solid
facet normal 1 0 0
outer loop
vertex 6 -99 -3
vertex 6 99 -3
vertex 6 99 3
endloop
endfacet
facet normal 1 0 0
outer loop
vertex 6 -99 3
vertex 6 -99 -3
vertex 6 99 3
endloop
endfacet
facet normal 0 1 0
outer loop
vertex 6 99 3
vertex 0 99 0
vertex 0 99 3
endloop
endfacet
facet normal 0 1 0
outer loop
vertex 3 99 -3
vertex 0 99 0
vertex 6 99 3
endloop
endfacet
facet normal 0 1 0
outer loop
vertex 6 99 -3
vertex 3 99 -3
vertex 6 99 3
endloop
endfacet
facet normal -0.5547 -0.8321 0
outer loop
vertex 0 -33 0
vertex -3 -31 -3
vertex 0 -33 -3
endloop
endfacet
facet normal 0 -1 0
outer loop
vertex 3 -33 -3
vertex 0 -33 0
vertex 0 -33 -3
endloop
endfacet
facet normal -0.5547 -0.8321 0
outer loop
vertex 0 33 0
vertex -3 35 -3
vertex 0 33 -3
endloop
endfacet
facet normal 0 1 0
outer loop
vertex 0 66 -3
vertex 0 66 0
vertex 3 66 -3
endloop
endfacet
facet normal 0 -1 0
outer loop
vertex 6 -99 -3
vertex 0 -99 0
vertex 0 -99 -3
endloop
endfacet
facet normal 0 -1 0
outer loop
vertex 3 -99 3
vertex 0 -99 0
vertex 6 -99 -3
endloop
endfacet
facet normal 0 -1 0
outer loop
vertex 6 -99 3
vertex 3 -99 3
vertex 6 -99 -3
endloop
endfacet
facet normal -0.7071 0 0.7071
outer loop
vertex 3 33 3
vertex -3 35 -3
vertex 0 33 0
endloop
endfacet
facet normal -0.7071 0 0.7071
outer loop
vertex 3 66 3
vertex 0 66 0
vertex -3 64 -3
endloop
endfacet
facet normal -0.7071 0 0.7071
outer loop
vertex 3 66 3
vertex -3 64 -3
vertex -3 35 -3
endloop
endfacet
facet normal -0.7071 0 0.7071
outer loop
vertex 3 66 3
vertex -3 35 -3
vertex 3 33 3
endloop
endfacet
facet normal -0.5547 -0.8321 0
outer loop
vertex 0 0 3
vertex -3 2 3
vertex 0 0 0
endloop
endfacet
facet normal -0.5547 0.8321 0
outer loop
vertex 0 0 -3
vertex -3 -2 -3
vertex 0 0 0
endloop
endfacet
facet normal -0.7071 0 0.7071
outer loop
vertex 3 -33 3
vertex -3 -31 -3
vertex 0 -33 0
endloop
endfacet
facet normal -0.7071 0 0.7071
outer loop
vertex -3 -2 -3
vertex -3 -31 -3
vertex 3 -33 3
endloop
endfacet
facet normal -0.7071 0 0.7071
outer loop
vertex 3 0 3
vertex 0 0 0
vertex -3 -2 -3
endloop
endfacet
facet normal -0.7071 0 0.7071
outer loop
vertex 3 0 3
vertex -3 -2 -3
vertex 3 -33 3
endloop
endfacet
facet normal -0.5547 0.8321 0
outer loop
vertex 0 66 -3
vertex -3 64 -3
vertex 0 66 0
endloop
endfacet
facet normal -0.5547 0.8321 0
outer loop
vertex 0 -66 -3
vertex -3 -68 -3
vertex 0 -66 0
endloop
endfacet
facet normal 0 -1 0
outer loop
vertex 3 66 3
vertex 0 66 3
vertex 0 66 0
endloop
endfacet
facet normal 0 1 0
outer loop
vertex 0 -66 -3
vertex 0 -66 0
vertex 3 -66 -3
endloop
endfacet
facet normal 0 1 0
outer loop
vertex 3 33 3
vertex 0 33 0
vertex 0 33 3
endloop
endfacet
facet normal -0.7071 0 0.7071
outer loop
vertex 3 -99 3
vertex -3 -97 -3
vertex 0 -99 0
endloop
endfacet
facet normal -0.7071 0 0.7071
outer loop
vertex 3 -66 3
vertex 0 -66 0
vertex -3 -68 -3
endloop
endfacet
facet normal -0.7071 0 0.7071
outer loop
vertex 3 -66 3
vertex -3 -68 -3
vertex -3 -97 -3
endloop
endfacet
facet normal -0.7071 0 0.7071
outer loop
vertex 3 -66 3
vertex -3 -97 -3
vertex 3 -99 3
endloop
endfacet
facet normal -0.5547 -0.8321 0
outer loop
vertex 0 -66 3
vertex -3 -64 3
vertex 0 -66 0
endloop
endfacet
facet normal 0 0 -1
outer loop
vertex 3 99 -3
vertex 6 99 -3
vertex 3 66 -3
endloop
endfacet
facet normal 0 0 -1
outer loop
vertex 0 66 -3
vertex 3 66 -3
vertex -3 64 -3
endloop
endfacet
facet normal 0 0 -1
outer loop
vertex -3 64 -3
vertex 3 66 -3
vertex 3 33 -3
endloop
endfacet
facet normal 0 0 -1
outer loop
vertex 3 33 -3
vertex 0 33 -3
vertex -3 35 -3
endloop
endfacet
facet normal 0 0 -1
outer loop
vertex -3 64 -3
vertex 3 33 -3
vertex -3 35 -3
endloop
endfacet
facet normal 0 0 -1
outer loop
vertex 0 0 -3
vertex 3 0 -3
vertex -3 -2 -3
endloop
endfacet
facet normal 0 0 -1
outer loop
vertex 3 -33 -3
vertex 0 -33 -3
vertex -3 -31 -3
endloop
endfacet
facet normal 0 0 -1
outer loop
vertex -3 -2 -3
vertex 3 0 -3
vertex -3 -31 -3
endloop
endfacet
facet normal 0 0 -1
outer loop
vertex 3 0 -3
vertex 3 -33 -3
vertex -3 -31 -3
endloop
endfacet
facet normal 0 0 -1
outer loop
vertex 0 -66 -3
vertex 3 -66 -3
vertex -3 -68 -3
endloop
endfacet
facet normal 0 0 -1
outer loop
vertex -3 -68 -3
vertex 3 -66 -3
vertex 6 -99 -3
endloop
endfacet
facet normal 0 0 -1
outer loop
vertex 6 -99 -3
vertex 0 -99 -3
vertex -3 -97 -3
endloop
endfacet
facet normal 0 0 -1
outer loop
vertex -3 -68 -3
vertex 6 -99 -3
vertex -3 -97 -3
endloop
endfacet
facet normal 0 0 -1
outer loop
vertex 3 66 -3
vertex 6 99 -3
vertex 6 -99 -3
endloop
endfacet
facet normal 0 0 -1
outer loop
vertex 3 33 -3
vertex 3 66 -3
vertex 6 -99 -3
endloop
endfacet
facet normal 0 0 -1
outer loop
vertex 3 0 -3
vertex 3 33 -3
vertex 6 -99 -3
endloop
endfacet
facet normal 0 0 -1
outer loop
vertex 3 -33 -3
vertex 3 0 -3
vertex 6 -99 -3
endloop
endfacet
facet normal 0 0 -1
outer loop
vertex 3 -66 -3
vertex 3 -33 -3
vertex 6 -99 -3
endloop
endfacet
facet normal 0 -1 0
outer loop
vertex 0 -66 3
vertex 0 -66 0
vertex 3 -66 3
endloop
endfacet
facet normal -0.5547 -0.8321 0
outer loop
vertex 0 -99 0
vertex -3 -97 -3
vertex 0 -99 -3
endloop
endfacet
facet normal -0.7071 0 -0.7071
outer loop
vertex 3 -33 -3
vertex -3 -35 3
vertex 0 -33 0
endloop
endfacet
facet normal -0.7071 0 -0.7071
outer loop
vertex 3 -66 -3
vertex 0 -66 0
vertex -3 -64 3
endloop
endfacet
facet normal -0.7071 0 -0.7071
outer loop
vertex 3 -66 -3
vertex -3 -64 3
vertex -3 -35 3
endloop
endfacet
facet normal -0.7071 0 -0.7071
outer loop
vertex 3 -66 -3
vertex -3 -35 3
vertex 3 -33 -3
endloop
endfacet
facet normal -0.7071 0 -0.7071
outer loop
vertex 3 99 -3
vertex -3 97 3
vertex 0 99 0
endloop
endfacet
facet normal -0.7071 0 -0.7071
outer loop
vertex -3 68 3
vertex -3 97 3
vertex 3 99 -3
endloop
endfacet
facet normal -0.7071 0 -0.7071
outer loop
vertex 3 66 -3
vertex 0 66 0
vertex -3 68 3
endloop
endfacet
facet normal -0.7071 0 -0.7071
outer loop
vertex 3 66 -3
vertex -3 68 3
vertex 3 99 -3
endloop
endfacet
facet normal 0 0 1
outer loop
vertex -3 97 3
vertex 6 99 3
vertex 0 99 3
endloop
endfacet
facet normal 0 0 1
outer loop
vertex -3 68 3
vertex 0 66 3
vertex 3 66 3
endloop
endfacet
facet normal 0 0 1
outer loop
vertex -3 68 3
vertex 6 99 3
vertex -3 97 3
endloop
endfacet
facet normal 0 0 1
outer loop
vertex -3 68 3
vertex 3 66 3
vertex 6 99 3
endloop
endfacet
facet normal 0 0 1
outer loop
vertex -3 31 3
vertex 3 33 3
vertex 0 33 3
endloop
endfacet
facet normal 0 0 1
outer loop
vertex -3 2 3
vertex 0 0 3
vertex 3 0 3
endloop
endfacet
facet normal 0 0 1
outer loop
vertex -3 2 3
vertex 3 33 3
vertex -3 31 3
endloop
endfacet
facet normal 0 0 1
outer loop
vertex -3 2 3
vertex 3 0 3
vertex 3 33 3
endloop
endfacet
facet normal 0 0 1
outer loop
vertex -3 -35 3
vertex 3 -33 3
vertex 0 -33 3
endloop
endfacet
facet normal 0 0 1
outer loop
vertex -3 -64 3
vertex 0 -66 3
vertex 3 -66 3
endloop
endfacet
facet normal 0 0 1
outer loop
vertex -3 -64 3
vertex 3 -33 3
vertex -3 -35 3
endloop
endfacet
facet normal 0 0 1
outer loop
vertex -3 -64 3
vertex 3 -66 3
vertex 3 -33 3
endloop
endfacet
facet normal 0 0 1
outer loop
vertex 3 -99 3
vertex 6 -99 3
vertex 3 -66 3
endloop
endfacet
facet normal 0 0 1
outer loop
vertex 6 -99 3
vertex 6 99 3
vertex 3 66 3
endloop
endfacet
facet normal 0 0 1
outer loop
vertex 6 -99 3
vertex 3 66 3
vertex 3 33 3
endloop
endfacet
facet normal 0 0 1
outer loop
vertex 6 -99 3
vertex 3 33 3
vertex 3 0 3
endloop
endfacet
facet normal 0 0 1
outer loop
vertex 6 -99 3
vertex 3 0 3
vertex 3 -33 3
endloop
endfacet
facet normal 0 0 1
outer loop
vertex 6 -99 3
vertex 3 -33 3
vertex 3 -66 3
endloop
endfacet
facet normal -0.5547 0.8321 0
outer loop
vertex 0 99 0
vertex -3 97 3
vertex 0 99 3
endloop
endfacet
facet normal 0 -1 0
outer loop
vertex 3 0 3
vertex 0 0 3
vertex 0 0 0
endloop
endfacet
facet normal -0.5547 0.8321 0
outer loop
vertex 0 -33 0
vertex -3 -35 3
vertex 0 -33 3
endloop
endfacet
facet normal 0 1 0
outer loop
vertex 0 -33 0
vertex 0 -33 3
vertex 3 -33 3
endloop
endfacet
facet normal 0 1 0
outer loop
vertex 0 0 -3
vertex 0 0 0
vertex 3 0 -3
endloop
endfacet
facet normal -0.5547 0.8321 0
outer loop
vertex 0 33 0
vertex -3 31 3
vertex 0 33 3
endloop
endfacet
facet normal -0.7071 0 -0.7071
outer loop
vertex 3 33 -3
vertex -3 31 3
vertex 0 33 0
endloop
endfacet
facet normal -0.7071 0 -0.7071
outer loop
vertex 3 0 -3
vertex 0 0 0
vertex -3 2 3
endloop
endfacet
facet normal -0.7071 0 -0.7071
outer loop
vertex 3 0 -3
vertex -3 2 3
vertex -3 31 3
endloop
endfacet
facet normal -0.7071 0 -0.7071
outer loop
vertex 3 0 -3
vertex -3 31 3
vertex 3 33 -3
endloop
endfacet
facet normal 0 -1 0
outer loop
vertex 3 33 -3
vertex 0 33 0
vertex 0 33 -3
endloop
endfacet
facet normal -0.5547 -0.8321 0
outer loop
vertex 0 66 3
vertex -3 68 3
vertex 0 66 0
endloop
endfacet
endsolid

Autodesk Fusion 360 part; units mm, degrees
sketch "wedge side" plane through (0, 0, 0) normal (0, 1, 0) x (1, 0, 0)
  line L0 (0, 0) -> (5.0614, 5.0614)
  line L1 (0, 0) -> (7.1578, 0) construction
  line L2 (0, 0) -> (-1.312, -1.312)
  line L3 (-1.312, -1.312) -> (-10.924, -10.924)
  line L4 (12.4749, 3) -> (-4.8473, 3)
  line L5 (8.9736, -3) -> (-11.747, -3)
  line L6 (6, 3) -> (6, -3)
  dimension "d3" = 45
  dimension "d4" = 3
  dimension "d5" = 3
  dimension "d6" = 6
extrude "Extrude1" add sketch "wedge side" along normal blind 33 makes body 1
sketch "clip corners" plane through (0, 0, 3) normal (0, 0, 1) x (1, 0, 0)
  line L0 (-3, 0) -> (6, 0)
  line L1 (6, 0) -> (6, 33)
  line L2 (6, 33) -> (-3, 33)
  line L3 (-3, 33) -> (-3, 0)
  line L4 (-3, 31) -> (0, 33)
  line L5 (6, 16.5) -> (-3, 16.5) construction
  line L6 (-3, 2) -> (0, 0)
  dimension "d9" = 2
  dimension "d10" = 3
extrude "Extrude2" cut sketch "clip corners" against normal blind 10 contours L0 L3 L6 | L2 L3 L4 bodies 1
copy_body "CopyPasteBodies1" bodies 1 makes body 2
move_body "Move1" bodies 2 to x (1, 0, 0) y (0, -1, 0) z (0, 0, -1) at (0, 0, 0)
combine "Combine1" operation add target body 1 tool bodies 2
pattern_linear "R-Pattern1" count 3 spacing 66 along (0, 1, 0) both ways of bodies 1 makes body 3 at (6, -77, -1) makes body 4 at (6, 55, -1)
combine "Combine2" operation add target body 1 tool bodies 3 4
